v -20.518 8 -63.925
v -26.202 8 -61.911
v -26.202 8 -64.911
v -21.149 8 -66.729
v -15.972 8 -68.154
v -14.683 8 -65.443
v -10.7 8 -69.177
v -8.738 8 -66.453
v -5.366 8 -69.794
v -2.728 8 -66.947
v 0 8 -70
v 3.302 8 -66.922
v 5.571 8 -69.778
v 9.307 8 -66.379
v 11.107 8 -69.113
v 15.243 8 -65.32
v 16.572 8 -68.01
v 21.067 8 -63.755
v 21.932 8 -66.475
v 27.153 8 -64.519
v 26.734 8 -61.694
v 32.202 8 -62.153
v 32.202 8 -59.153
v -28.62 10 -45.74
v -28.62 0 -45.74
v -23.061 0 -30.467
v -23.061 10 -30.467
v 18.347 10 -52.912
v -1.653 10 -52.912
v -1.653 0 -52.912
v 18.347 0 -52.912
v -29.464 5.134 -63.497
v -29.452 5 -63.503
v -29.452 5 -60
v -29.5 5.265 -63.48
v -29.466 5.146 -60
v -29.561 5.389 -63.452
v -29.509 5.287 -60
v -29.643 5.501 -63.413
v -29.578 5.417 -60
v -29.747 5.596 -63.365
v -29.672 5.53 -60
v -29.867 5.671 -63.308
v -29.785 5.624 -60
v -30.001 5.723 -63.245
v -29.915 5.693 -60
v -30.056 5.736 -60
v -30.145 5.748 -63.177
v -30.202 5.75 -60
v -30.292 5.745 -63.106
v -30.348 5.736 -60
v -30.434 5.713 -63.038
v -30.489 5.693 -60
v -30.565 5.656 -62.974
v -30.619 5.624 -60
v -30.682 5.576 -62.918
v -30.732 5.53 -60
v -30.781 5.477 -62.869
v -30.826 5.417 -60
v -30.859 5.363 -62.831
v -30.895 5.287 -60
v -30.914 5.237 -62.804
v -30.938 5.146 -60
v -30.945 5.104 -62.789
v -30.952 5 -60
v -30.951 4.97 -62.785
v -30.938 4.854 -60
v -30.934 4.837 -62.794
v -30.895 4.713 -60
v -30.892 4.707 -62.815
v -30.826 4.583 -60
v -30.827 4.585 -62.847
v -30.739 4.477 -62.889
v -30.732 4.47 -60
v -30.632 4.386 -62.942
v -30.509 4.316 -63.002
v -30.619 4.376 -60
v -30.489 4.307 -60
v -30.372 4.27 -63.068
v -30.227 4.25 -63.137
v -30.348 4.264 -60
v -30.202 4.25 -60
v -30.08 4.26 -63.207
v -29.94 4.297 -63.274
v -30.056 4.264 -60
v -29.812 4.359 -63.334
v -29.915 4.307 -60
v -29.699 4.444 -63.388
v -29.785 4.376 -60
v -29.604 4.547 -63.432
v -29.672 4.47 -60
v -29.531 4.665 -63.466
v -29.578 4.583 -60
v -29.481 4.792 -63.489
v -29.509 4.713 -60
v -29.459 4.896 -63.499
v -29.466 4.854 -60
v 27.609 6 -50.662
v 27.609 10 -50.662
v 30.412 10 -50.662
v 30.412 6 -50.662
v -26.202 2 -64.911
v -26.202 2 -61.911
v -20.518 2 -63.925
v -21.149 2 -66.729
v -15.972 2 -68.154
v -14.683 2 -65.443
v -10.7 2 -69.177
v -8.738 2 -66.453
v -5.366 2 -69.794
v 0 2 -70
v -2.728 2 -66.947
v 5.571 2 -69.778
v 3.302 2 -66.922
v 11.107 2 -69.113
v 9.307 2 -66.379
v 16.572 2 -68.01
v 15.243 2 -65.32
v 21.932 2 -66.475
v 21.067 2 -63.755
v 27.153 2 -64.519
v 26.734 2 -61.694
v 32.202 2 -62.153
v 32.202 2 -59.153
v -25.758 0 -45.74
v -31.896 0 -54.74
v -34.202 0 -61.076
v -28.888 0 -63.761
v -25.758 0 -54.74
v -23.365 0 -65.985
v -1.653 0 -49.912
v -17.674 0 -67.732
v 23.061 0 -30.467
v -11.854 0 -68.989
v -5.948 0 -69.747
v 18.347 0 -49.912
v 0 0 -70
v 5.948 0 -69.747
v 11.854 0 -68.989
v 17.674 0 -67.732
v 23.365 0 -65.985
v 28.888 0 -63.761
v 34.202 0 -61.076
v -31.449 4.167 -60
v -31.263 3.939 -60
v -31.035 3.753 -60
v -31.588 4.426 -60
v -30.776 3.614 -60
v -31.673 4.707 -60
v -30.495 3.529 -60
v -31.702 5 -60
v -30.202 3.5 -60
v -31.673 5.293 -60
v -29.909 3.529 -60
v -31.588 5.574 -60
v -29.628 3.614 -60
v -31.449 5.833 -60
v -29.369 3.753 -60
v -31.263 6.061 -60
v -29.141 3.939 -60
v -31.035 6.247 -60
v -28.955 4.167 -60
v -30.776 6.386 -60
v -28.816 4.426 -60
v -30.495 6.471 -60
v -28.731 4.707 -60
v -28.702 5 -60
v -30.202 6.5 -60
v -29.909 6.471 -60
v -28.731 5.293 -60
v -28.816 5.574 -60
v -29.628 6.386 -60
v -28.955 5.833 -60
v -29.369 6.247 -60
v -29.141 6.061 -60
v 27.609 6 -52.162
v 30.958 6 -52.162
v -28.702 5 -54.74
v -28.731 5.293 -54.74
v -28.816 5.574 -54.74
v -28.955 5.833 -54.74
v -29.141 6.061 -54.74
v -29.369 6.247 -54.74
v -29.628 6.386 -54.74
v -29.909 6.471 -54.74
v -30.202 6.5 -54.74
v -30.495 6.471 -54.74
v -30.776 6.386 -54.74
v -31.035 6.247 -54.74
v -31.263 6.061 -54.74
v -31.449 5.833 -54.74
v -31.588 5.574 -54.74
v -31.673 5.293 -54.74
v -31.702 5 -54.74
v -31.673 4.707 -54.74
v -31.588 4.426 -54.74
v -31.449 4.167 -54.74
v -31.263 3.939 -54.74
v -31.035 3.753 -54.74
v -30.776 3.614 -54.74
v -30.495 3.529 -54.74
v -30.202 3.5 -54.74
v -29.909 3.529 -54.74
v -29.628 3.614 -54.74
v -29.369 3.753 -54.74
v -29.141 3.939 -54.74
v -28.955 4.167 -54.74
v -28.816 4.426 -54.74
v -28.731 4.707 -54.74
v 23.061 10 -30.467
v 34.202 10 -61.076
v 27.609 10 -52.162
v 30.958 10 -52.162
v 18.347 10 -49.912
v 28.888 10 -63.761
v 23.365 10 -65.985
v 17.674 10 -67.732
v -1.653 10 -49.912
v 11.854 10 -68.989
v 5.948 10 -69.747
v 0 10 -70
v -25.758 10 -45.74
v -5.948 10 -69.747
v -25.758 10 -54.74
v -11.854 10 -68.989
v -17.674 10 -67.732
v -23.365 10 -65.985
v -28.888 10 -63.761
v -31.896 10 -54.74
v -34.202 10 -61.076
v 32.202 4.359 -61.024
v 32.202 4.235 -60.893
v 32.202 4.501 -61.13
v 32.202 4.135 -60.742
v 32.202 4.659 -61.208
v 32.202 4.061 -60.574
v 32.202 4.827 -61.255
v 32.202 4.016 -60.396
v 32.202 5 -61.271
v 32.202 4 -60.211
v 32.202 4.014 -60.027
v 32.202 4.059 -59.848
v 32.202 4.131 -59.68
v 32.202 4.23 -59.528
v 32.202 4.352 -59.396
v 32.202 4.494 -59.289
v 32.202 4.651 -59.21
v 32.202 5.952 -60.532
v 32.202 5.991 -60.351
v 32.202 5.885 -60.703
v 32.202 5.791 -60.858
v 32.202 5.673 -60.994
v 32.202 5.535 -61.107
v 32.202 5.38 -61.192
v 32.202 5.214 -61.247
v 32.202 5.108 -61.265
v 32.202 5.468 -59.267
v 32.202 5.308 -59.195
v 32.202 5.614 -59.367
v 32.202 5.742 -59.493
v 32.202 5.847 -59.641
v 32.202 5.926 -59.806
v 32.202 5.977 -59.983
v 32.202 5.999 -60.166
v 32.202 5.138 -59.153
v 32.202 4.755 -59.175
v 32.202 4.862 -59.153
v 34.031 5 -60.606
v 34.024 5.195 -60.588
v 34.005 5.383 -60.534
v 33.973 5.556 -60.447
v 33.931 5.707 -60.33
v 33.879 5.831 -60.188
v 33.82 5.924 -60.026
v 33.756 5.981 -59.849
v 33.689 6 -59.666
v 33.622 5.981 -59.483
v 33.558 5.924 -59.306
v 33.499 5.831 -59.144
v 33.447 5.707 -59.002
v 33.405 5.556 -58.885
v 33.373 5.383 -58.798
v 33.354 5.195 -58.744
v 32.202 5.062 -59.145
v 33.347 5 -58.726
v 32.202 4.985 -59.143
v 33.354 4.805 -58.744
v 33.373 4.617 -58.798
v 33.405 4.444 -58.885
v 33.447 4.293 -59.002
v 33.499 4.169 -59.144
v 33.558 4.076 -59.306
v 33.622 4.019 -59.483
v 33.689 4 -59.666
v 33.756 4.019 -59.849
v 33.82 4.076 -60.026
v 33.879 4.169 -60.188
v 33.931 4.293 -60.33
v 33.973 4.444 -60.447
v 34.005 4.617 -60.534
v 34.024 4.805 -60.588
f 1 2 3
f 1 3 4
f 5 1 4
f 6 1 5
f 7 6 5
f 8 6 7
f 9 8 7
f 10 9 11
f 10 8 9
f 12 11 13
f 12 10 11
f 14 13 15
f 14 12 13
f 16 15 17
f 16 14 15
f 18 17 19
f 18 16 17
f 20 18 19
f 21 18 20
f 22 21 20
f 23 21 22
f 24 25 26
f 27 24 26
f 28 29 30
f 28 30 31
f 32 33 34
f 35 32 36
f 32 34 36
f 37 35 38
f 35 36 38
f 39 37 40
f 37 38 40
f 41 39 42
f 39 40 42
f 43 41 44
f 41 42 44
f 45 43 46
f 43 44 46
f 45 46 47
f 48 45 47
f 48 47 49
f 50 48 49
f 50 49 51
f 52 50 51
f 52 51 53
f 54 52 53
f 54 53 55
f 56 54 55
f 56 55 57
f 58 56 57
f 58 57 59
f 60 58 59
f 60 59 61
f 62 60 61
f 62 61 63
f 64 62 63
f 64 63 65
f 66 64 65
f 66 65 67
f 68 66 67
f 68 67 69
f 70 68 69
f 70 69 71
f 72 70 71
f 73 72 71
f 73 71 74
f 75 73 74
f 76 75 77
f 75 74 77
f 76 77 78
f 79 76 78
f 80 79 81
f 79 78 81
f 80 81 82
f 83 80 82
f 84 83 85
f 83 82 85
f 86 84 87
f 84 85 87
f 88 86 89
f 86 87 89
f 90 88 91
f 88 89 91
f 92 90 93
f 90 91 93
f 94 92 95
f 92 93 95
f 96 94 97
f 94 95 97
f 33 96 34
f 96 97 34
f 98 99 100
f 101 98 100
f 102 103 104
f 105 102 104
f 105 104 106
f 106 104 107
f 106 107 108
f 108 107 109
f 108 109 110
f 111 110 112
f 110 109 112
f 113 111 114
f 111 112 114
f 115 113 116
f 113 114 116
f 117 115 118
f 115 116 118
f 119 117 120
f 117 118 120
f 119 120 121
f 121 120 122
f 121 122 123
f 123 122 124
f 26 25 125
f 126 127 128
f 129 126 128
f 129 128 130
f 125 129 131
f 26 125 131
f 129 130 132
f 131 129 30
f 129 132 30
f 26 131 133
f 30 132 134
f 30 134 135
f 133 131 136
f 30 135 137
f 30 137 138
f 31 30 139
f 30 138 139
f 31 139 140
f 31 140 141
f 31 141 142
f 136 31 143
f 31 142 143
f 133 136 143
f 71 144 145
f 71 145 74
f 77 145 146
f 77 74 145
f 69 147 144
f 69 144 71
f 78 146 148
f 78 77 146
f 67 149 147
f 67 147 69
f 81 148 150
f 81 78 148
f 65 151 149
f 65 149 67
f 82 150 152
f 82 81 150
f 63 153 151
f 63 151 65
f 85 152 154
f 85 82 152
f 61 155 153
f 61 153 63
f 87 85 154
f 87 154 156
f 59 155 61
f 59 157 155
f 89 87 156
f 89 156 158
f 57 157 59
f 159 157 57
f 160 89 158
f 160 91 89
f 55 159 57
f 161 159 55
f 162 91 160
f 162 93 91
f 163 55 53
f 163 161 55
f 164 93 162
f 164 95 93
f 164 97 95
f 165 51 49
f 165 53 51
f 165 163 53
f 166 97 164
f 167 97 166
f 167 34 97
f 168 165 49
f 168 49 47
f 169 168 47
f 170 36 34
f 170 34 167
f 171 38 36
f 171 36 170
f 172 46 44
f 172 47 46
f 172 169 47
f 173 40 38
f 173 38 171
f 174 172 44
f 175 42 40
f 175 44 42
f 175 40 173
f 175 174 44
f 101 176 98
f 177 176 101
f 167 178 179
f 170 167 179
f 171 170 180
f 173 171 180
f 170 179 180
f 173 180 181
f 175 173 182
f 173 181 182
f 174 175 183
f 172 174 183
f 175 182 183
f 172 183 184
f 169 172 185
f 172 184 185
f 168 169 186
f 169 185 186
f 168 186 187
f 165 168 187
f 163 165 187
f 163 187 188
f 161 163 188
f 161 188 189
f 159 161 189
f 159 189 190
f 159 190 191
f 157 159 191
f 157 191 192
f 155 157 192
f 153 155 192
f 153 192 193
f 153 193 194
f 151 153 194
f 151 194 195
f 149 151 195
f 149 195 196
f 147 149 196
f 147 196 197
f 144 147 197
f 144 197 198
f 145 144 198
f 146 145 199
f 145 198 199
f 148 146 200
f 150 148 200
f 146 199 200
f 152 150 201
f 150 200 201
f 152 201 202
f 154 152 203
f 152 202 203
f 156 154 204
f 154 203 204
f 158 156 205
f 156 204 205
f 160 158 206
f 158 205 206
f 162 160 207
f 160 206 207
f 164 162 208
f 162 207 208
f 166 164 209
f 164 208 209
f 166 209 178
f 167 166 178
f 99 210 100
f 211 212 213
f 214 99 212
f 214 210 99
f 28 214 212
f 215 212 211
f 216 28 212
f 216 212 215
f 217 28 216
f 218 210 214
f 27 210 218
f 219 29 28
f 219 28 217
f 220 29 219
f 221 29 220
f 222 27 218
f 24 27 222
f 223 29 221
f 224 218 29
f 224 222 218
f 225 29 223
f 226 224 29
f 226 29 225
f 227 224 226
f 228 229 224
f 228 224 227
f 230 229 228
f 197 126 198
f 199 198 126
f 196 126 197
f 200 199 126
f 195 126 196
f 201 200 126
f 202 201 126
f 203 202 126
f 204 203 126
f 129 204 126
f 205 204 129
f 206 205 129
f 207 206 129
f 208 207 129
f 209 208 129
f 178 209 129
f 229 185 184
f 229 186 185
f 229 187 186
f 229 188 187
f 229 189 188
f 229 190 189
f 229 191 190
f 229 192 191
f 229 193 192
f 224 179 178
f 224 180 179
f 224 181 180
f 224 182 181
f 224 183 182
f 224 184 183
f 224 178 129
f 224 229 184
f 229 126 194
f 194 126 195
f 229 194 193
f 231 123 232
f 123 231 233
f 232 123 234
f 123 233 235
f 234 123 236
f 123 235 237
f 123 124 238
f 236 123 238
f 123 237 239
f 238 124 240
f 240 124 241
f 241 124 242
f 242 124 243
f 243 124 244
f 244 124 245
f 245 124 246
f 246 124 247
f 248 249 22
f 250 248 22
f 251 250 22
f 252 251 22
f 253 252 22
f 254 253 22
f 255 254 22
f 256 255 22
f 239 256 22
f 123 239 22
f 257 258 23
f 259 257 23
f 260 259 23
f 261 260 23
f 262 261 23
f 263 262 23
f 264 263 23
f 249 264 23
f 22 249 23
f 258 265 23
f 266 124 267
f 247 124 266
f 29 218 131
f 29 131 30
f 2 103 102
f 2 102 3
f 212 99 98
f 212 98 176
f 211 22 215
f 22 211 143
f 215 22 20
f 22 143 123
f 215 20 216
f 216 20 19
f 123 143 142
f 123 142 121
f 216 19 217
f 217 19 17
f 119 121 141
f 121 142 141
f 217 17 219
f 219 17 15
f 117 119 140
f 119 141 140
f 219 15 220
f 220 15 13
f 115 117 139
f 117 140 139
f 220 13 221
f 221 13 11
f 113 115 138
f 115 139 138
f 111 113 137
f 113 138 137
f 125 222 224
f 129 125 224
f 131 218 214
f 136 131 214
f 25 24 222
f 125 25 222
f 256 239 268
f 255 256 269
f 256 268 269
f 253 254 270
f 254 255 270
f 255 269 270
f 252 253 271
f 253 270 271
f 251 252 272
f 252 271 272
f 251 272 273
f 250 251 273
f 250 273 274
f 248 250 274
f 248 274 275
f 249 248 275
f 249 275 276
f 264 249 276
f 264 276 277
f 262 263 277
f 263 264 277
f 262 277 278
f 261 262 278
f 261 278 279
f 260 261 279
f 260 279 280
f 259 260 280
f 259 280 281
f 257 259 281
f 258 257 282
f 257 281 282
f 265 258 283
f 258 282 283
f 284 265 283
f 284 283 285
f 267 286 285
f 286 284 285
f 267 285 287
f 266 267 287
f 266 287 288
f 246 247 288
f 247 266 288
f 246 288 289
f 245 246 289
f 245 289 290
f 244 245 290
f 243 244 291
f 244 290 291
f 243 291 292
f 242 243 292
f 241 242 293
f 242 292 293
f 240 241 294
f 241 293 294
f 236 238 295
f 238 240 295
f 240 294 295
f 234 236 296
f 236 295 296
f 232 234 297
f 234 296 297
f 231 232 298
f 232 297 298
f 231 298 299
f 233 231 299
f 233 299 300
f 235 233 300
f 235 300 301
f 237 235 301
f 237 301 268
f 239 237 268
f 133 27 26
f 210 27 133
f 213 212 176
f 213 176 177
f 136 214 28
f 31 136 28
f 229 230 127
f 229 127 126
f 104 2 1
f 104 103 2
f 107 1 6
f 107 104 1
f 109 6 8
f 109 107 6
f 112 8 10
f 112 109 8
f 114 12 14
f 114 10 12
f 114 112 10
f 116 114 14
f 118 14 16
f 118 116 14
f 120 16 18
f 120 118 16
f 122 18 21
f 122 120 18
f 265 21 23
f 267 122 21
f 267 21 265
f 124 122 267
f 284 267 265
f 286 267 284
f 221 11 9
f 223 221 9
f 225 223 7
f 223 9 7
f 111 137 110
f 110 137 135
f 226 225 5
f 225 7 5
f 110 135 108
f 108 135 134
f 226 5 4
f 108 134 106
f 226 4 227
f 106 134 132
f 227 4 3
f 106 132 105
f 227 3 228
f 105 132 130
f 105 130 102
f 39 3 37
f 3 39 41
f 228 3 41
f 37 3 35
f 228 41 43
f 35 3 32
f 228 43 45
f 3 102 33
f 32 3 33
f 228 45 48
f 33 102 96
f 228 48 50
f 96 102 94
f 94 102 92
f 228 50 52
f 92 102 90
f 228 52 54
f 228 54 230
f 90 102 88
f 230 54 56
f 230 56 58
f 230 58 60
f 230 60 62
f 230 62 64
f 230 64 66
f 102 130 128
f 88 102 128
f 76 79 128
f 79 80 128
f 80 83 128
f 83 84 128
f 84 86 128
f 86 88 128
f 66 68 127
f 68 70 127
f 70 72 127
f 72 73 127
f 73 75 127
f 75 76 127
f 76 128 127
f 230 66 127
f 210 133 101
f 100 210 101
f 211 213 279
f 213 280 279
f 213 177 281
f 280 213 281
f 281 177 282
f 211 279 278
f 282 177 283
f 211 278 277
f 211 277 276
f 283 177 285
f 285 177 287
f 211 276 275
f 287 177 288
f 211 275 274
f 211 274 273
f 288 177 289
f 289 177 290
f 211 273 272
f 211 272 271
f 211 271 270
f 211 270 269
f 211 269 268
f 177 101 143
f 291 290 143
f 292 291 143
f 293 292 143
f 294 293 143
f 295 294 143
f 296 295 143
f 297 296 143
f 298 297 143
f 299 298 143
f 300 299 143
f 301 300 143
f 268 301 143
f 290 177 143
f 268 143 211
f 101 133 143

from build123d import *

# Parameters (mm, degrees)
EXTRUDE_1_DEPTH            = 48
CUT_EXTRUDE_2_REACH        = 96.508
CUT_EXTRUDE_2_START_RADIUS = 70
CUT_EXTRUDE_2_END_RADIUS   = 70
SKETCH_3_W                 = 58.404028666
SKETCH_3_H                 = 6
EXTRUDE_2_DEPTH            = 13
CUT_EXTRUDE_3_DEPTH        = 140.034418617
CUT_EXTRUDE_3_DEPTH_BACK   = 140.034418617
SKETCH_4_W                 = 25
SKETCH_4_H                 = 38
SKETCH_4_W_2               = 40
SKETCH_4_H_2               = 25
CHAMFER_1_SIZE             = 5
CHAMFER_1_SIZE2            = 3.813196151
SKETCH_6_R                 = 6.5
CUT_EXTRUDE_4_DEPTH        = 2
SKETCH_7_R                 = 1.5
CUT_EXTRUDE_5_DEPTH        = 60
SKETCH_8_W                 = 9
SKETCH_8_H                 = 9
CUT_EXTRUDE_6_DEPTH        = 11
CUT_EXTRUDE_8_REACH        = 137.533
SKETCH_10_R                = 1
CUT_EXTRUDE_9_REACH        = 105.034
CUT_EXTRUDE_9_END_RADIUS   = 70
SKETCH_11_R                = 0.75
SKETCH_12_W                = 20
SKETCH_12_H                = 3
CUT_EXTRUDE_10_DEPTH       = 11
SKETCH_13_W                = 3.868283576
SKETCH_13_H                = 1.5
CUT_EXTRUDE_11_DEPTH       = 4
CUT_EXTRUDE_12_REACH       = 137.476
SKETCH_15_OUTSIDE_W        = 122.502
SKETCH_15_OUTSIDE_H        = 162.955
SKETCH_15_OUTSIDE_W_2      = 109.971714071
SKETCH_15_OUTSIDE_H_2      = 49.254432198
CUT_EXTRUDE_13_DEPTH       = 10


with BuildPart() as part:
    # 草图1 → 凸台-拉伸1 (new body)
    with BuildSketch(Plane(origin=(0, 0, 0), x_dir=(1, 0, 0), z_dir=(0, 1, 0))):
        with BuildLine():
            ThreePointArc((-9.396926208, -7.075874358), (-5.735764364, -11.847193368), (0, -13.655672925))
            Line((0, -13.655672925), (0, -5))
            ThreePointArc((0, -5), (-5, 0), (0, 5))
            Line((0, 5), (0, 70))
            ThreePointArc((0, 70), (-17.673593853, 67.732149533), (-34.202014333, 61.075545152))
            Line((-34.202014333, 61.075545152), (-9.396926208, -7.075874358))
        make_face()
        with BuildLine():
            Line((0, -5), (0, -13.655672925))
            ThreePointArc((0, -13.655672925), (5.735764364, -11.847193368), (9.396926208, -7.075874358))
            Line((9.396926208, -7.075874358), (34.202014333, 61.075545152))
            ThreePointArc((34.202014333, 61.075545152), (17.673593853, 67.732149533), (0, 70))
            Line((0, 70), (0, 5))
            ThreePointArc((0, 5), (3.535533906, 3.535533906), (5, 0))
            ThreePointArc((5, 0), (3.535533906, -3.535533906), (0, -5))
        make_face()
    extrude(amount=EXTRUDE_1_DEPTH)

    # 切除-拉伸2: from a cylinder face, 96.508 long prism both ways, kept between that surface and its translate by the depth
    cut_extrude_2_start = Plane(origin=(0, 5, 0), z_dir=(0, -1, 0)) * Cylinder(CUT_EXTRUDE_2_START_RADIUS, 334.016, mode=Mode.PRIVATE)
    cut_extrude_2_end = Plane(origin=(0, 5, 3), z_dir=(0, -1, 0)) * Cylinder(CUT_EXTRUDE_2_END_RADIUS, 334.016, mode=Mode.PRIVATE)
    # 草图3 → 切除-拉伸2 (cut, from a surface)
    with BuildSketch(Plane.XY, mode=Mode.PRIVATE) as cut_extrude_2_sk1:
        with Locations((3, 5)):
            Rectangle(SKETCH_3_W, SKETCH_3_H)
    cut_extrude_2_tool1 = extrude(cut_extrude_2_sk1.sketch, amount=CUT_EXTRUDE_2_REACH, both=True, mode=Mode.PRIVATE)
    add(((cut_extrude_2_tool1 & cut_extrude_2_start) - cut_extrude_2_end).solids().sort_by_distance((3, 5, -62.032204))[0], mode=Mode.SUBTRACT)

    # 草图2 → 凸台-拉伸2 (add)
    with BuildSketch(Plane(origin=(0, 48, 0), x_dir=(1, 0, 0), z_dir=(0, 1, 0))):
        Polygon((24.252642572, 33.739870901), (55.034455471, 118.312206771), (20.125623779, 80.877067961), (5.458790156, 40.580273767), align=None)
    extrude(amount=-EXTRUDE_2_DEPTH)

    # 草图4 → 切除-拉伸3 (cut, two sides: drawn at the far end of the back side and taken through both)
    with BuildSketch(Plane(origin=(0, 0, 0), x_dir=(0, 0, -1), z_dir=(1, 0, 0)).offset(-CUT_EXTRUDE_3_DEPTH_BACK)):
        with Locations((-1.155672925, 29)):
            Rectangle(SKETCH_4_W, SKETCH_4_H)
        with Locations((50.466884927, 22.5)):
            Rectangle(SKETCH_4_W_2, SKETCH_4_H_2)
    extrude(amount=CUT_EXTRUDE_3_DEPTH + CUT_EXTRUDE_3_DEPTH_BACK, mode=Mode.SUBTRACT)

    # 倒角1
    chamfer_1_edges = [part.edges().sort_by_distance(p)[0] for p in [
        (55.034455471, 41.5, -118.312206771),
    ]]
    chamfer_1_side = [part.faces().sort_by_distance(p)[0] for p in [
        (37.580039625, 41.5, -99.594637366),
    ]]
    chamfer(chamfer_1_edges, length=CHAMFER_1_SIZE, length2=CHAMFER_1_SIZE2, reference=chamfer_1_side[0])

    # 草图6 → 切除-拉伸4 (cut)
    with BuildSketch(Plane.XZ):
        with Locations(Location((0, 0, 0), (0, 0, 270))):
            Circle(SKETCH_6_R)
    extrude(amount=-CUT_EXTRUDE_4_DEPTH, mode=Mode.SUBTRACT)

    # 草图7 → 切除-拉伸5 (cut)
    with BuildSketch(Plane.XY):
        with Locations((-30.202014333, 5)):
            Circle(SKETCH_7_R)
    extrude(amount=-CUT_EXTRUDE_5_DEPTH, mode=Mode.SUBTRACT)

    # 草图8 → 切除-拉伸6 (cut)
    with BuildSketch(Plane(origin=(0, 10, 0), x_dir=(1, 0, 0), z_dir=(0, 1, 0))):
        with Locations((-30.258231885, 50.240091929)):
            Rectangle(SKETCH_8_W, SKETCH_8_H)
    extrude(amount=-CUT_EXTRUDE_6_DEPTH, mode=Mode.SUBTRACT)

    # 切除-拉伸8: up to this plane
    cut_extrude_8_end = Plane(origin=(32.202014333, 48, -62.153280468), z_dir=(-1, 0, 0))
    # 草图10 → 切除-拉伸8 (cut, up to the surface)
    with BuildSketch(Plane(origin=(10.571836839, 0, 3.847833931), x_dir=(0.34202014332566283, 0, -0.9396926207859106), z_dir=(0.9396926207859106, 0, 0.34202014332566283)), mode=Mode.PRIVATE) as cut_extrude_8_sk1:
        with Locations((67.590016934, 5)):
            Circle(SKETCH_10_R)
    cut_extrude_8_tool1 = split(extrude(cut_extrude_8_sk1.sketch, amount=-CUT_EXTRUDE_8_REACH, mode=Mode.PRIVATE), bisect_by=cut_extrude_8_end, keep=Keep.BOTH, mode=Mode.PRIVATE)
    add(cut_extrude_8_tool1.solids().sort_by_distance((33.688984, 5, -59.666006))[0], mode=Mode.SUBTRACT)

    # 切除-拉伸9: up to this cylinder (the profile starts inside it)
    cut_extrude_9_end = Plane(origin=(0, 5, 0), z_dir=(0, -1, 0)) * Cylinder(CUT_EXTRUDE_9_END_RADIUS, 351.068, mode=Mode.PRIVATE)
    # 草图11 → 切除-拉伸9 (cut, up to the surface)
    with BuildSketch(Plane.XY.offset(-60), mode=Mode.PRIVATE) as cut_extrude_9_sk1:
        with Locations((-30.202014333, 5)):
            Circle(SKETCH_11_R)
    cut_extrude_9_tool1 = extrude(cut_extrude_9_sk1.sketch, amount=-CUT_EXTRUDE_9_REACH, mode=Mode.PRIVATE) & cut_extrude_9_end
    add(cut_extrude_9_tool1.solids().sort_by_distance((-30.202014, 5, -60))[0], mode=Mode.SUBTRACT)

    # 草图12 → 切除-拉伸10 (cut)
    with BuildSketch(Plane(origin=(0, 10, 0), x_dir=(1, 0, 0), z_dir=(0, 1, 0))):
        with Locations((8.346963974, 51.411545488)):
            Rectangle(SKETCH_12_W, SKETCH_12_H)
    extrude(amount=-CUT_EXTRUDE_10_DEPTH, mode=Mode.SUBTRACT)

    # 草图13 → 切除-拉伸11 (cut)
    with BuildSketch(Plane(origin=(0, 10, 0), x_dir=(1, 0, 0), z_dir=(0, 1, 0))):
        with Locations((29.542762739, 51.411545488)):
            Rectangle(SKETCH_13_W, SKETCH_13_H)
    extrude(amount=-CUT_EXTRUDE_11_DEPTH, mode=Mode.SUBTRACT)

    # 草图14 → 切除-拉伸12 (cut, up to next)
    with BuildSketch(Plane(origin=(0, 48, 0), x_dir=(1, 0, 0), z_dir=(0, 1, 0)), mode=Mode.PRIVATE) as cut_extrude_12_sk1:
        Polygon((49.766128767, 108.223290792), (49.034775066, 108.905289152), (40.168796385, 99.397691031), (40.900150086, 98.715692671), align=None)
    cut_extrude_12_tool1 = extrude(cut_extrude_12_sk1.sketch, amount=-CUT_EXTRUDE_12_REACH, mode=Mode.PRIVATE) & part.part
    add(cut_extrude_12_tool1.solids().sort_by_distance((44.967463, 48, -103.810491))[0], mode=Mode.SUBTRACT)

    # 草图15 outside → 切除-拉伸13 (cut)
    with BuildSketch(Plane(origin=(0, 10, 0), x_dir=(1, 0, 0), z_dir=(0, 1, 0))):
        with Locations((9.764, 50.5365)):
            Rectangle(SKETCH_15_OUTSIDE_W, SKETCH_15_OUTSIDE_H)
        with Locations((3.943147272, 55.094101026)):
            Rectangle(SKETCH_15_OUTSIDE_W_2, SKETCH_15_OUTSIDE_H_2, mode=Mode.SUBTRACT)
    extrude(amount=-CUT_EXTRUDE_13_DEPTH, mode=Mode.SUBTRACT)


with BuildPart() as body_2:
    # of the pieces the cut leaves, the one that is kept (cut_extrude_13_keep)
    add(part.part.solids().sort_by_distance((23.0613731, 0, -30.466884927))[0])


solid = body_2.part
